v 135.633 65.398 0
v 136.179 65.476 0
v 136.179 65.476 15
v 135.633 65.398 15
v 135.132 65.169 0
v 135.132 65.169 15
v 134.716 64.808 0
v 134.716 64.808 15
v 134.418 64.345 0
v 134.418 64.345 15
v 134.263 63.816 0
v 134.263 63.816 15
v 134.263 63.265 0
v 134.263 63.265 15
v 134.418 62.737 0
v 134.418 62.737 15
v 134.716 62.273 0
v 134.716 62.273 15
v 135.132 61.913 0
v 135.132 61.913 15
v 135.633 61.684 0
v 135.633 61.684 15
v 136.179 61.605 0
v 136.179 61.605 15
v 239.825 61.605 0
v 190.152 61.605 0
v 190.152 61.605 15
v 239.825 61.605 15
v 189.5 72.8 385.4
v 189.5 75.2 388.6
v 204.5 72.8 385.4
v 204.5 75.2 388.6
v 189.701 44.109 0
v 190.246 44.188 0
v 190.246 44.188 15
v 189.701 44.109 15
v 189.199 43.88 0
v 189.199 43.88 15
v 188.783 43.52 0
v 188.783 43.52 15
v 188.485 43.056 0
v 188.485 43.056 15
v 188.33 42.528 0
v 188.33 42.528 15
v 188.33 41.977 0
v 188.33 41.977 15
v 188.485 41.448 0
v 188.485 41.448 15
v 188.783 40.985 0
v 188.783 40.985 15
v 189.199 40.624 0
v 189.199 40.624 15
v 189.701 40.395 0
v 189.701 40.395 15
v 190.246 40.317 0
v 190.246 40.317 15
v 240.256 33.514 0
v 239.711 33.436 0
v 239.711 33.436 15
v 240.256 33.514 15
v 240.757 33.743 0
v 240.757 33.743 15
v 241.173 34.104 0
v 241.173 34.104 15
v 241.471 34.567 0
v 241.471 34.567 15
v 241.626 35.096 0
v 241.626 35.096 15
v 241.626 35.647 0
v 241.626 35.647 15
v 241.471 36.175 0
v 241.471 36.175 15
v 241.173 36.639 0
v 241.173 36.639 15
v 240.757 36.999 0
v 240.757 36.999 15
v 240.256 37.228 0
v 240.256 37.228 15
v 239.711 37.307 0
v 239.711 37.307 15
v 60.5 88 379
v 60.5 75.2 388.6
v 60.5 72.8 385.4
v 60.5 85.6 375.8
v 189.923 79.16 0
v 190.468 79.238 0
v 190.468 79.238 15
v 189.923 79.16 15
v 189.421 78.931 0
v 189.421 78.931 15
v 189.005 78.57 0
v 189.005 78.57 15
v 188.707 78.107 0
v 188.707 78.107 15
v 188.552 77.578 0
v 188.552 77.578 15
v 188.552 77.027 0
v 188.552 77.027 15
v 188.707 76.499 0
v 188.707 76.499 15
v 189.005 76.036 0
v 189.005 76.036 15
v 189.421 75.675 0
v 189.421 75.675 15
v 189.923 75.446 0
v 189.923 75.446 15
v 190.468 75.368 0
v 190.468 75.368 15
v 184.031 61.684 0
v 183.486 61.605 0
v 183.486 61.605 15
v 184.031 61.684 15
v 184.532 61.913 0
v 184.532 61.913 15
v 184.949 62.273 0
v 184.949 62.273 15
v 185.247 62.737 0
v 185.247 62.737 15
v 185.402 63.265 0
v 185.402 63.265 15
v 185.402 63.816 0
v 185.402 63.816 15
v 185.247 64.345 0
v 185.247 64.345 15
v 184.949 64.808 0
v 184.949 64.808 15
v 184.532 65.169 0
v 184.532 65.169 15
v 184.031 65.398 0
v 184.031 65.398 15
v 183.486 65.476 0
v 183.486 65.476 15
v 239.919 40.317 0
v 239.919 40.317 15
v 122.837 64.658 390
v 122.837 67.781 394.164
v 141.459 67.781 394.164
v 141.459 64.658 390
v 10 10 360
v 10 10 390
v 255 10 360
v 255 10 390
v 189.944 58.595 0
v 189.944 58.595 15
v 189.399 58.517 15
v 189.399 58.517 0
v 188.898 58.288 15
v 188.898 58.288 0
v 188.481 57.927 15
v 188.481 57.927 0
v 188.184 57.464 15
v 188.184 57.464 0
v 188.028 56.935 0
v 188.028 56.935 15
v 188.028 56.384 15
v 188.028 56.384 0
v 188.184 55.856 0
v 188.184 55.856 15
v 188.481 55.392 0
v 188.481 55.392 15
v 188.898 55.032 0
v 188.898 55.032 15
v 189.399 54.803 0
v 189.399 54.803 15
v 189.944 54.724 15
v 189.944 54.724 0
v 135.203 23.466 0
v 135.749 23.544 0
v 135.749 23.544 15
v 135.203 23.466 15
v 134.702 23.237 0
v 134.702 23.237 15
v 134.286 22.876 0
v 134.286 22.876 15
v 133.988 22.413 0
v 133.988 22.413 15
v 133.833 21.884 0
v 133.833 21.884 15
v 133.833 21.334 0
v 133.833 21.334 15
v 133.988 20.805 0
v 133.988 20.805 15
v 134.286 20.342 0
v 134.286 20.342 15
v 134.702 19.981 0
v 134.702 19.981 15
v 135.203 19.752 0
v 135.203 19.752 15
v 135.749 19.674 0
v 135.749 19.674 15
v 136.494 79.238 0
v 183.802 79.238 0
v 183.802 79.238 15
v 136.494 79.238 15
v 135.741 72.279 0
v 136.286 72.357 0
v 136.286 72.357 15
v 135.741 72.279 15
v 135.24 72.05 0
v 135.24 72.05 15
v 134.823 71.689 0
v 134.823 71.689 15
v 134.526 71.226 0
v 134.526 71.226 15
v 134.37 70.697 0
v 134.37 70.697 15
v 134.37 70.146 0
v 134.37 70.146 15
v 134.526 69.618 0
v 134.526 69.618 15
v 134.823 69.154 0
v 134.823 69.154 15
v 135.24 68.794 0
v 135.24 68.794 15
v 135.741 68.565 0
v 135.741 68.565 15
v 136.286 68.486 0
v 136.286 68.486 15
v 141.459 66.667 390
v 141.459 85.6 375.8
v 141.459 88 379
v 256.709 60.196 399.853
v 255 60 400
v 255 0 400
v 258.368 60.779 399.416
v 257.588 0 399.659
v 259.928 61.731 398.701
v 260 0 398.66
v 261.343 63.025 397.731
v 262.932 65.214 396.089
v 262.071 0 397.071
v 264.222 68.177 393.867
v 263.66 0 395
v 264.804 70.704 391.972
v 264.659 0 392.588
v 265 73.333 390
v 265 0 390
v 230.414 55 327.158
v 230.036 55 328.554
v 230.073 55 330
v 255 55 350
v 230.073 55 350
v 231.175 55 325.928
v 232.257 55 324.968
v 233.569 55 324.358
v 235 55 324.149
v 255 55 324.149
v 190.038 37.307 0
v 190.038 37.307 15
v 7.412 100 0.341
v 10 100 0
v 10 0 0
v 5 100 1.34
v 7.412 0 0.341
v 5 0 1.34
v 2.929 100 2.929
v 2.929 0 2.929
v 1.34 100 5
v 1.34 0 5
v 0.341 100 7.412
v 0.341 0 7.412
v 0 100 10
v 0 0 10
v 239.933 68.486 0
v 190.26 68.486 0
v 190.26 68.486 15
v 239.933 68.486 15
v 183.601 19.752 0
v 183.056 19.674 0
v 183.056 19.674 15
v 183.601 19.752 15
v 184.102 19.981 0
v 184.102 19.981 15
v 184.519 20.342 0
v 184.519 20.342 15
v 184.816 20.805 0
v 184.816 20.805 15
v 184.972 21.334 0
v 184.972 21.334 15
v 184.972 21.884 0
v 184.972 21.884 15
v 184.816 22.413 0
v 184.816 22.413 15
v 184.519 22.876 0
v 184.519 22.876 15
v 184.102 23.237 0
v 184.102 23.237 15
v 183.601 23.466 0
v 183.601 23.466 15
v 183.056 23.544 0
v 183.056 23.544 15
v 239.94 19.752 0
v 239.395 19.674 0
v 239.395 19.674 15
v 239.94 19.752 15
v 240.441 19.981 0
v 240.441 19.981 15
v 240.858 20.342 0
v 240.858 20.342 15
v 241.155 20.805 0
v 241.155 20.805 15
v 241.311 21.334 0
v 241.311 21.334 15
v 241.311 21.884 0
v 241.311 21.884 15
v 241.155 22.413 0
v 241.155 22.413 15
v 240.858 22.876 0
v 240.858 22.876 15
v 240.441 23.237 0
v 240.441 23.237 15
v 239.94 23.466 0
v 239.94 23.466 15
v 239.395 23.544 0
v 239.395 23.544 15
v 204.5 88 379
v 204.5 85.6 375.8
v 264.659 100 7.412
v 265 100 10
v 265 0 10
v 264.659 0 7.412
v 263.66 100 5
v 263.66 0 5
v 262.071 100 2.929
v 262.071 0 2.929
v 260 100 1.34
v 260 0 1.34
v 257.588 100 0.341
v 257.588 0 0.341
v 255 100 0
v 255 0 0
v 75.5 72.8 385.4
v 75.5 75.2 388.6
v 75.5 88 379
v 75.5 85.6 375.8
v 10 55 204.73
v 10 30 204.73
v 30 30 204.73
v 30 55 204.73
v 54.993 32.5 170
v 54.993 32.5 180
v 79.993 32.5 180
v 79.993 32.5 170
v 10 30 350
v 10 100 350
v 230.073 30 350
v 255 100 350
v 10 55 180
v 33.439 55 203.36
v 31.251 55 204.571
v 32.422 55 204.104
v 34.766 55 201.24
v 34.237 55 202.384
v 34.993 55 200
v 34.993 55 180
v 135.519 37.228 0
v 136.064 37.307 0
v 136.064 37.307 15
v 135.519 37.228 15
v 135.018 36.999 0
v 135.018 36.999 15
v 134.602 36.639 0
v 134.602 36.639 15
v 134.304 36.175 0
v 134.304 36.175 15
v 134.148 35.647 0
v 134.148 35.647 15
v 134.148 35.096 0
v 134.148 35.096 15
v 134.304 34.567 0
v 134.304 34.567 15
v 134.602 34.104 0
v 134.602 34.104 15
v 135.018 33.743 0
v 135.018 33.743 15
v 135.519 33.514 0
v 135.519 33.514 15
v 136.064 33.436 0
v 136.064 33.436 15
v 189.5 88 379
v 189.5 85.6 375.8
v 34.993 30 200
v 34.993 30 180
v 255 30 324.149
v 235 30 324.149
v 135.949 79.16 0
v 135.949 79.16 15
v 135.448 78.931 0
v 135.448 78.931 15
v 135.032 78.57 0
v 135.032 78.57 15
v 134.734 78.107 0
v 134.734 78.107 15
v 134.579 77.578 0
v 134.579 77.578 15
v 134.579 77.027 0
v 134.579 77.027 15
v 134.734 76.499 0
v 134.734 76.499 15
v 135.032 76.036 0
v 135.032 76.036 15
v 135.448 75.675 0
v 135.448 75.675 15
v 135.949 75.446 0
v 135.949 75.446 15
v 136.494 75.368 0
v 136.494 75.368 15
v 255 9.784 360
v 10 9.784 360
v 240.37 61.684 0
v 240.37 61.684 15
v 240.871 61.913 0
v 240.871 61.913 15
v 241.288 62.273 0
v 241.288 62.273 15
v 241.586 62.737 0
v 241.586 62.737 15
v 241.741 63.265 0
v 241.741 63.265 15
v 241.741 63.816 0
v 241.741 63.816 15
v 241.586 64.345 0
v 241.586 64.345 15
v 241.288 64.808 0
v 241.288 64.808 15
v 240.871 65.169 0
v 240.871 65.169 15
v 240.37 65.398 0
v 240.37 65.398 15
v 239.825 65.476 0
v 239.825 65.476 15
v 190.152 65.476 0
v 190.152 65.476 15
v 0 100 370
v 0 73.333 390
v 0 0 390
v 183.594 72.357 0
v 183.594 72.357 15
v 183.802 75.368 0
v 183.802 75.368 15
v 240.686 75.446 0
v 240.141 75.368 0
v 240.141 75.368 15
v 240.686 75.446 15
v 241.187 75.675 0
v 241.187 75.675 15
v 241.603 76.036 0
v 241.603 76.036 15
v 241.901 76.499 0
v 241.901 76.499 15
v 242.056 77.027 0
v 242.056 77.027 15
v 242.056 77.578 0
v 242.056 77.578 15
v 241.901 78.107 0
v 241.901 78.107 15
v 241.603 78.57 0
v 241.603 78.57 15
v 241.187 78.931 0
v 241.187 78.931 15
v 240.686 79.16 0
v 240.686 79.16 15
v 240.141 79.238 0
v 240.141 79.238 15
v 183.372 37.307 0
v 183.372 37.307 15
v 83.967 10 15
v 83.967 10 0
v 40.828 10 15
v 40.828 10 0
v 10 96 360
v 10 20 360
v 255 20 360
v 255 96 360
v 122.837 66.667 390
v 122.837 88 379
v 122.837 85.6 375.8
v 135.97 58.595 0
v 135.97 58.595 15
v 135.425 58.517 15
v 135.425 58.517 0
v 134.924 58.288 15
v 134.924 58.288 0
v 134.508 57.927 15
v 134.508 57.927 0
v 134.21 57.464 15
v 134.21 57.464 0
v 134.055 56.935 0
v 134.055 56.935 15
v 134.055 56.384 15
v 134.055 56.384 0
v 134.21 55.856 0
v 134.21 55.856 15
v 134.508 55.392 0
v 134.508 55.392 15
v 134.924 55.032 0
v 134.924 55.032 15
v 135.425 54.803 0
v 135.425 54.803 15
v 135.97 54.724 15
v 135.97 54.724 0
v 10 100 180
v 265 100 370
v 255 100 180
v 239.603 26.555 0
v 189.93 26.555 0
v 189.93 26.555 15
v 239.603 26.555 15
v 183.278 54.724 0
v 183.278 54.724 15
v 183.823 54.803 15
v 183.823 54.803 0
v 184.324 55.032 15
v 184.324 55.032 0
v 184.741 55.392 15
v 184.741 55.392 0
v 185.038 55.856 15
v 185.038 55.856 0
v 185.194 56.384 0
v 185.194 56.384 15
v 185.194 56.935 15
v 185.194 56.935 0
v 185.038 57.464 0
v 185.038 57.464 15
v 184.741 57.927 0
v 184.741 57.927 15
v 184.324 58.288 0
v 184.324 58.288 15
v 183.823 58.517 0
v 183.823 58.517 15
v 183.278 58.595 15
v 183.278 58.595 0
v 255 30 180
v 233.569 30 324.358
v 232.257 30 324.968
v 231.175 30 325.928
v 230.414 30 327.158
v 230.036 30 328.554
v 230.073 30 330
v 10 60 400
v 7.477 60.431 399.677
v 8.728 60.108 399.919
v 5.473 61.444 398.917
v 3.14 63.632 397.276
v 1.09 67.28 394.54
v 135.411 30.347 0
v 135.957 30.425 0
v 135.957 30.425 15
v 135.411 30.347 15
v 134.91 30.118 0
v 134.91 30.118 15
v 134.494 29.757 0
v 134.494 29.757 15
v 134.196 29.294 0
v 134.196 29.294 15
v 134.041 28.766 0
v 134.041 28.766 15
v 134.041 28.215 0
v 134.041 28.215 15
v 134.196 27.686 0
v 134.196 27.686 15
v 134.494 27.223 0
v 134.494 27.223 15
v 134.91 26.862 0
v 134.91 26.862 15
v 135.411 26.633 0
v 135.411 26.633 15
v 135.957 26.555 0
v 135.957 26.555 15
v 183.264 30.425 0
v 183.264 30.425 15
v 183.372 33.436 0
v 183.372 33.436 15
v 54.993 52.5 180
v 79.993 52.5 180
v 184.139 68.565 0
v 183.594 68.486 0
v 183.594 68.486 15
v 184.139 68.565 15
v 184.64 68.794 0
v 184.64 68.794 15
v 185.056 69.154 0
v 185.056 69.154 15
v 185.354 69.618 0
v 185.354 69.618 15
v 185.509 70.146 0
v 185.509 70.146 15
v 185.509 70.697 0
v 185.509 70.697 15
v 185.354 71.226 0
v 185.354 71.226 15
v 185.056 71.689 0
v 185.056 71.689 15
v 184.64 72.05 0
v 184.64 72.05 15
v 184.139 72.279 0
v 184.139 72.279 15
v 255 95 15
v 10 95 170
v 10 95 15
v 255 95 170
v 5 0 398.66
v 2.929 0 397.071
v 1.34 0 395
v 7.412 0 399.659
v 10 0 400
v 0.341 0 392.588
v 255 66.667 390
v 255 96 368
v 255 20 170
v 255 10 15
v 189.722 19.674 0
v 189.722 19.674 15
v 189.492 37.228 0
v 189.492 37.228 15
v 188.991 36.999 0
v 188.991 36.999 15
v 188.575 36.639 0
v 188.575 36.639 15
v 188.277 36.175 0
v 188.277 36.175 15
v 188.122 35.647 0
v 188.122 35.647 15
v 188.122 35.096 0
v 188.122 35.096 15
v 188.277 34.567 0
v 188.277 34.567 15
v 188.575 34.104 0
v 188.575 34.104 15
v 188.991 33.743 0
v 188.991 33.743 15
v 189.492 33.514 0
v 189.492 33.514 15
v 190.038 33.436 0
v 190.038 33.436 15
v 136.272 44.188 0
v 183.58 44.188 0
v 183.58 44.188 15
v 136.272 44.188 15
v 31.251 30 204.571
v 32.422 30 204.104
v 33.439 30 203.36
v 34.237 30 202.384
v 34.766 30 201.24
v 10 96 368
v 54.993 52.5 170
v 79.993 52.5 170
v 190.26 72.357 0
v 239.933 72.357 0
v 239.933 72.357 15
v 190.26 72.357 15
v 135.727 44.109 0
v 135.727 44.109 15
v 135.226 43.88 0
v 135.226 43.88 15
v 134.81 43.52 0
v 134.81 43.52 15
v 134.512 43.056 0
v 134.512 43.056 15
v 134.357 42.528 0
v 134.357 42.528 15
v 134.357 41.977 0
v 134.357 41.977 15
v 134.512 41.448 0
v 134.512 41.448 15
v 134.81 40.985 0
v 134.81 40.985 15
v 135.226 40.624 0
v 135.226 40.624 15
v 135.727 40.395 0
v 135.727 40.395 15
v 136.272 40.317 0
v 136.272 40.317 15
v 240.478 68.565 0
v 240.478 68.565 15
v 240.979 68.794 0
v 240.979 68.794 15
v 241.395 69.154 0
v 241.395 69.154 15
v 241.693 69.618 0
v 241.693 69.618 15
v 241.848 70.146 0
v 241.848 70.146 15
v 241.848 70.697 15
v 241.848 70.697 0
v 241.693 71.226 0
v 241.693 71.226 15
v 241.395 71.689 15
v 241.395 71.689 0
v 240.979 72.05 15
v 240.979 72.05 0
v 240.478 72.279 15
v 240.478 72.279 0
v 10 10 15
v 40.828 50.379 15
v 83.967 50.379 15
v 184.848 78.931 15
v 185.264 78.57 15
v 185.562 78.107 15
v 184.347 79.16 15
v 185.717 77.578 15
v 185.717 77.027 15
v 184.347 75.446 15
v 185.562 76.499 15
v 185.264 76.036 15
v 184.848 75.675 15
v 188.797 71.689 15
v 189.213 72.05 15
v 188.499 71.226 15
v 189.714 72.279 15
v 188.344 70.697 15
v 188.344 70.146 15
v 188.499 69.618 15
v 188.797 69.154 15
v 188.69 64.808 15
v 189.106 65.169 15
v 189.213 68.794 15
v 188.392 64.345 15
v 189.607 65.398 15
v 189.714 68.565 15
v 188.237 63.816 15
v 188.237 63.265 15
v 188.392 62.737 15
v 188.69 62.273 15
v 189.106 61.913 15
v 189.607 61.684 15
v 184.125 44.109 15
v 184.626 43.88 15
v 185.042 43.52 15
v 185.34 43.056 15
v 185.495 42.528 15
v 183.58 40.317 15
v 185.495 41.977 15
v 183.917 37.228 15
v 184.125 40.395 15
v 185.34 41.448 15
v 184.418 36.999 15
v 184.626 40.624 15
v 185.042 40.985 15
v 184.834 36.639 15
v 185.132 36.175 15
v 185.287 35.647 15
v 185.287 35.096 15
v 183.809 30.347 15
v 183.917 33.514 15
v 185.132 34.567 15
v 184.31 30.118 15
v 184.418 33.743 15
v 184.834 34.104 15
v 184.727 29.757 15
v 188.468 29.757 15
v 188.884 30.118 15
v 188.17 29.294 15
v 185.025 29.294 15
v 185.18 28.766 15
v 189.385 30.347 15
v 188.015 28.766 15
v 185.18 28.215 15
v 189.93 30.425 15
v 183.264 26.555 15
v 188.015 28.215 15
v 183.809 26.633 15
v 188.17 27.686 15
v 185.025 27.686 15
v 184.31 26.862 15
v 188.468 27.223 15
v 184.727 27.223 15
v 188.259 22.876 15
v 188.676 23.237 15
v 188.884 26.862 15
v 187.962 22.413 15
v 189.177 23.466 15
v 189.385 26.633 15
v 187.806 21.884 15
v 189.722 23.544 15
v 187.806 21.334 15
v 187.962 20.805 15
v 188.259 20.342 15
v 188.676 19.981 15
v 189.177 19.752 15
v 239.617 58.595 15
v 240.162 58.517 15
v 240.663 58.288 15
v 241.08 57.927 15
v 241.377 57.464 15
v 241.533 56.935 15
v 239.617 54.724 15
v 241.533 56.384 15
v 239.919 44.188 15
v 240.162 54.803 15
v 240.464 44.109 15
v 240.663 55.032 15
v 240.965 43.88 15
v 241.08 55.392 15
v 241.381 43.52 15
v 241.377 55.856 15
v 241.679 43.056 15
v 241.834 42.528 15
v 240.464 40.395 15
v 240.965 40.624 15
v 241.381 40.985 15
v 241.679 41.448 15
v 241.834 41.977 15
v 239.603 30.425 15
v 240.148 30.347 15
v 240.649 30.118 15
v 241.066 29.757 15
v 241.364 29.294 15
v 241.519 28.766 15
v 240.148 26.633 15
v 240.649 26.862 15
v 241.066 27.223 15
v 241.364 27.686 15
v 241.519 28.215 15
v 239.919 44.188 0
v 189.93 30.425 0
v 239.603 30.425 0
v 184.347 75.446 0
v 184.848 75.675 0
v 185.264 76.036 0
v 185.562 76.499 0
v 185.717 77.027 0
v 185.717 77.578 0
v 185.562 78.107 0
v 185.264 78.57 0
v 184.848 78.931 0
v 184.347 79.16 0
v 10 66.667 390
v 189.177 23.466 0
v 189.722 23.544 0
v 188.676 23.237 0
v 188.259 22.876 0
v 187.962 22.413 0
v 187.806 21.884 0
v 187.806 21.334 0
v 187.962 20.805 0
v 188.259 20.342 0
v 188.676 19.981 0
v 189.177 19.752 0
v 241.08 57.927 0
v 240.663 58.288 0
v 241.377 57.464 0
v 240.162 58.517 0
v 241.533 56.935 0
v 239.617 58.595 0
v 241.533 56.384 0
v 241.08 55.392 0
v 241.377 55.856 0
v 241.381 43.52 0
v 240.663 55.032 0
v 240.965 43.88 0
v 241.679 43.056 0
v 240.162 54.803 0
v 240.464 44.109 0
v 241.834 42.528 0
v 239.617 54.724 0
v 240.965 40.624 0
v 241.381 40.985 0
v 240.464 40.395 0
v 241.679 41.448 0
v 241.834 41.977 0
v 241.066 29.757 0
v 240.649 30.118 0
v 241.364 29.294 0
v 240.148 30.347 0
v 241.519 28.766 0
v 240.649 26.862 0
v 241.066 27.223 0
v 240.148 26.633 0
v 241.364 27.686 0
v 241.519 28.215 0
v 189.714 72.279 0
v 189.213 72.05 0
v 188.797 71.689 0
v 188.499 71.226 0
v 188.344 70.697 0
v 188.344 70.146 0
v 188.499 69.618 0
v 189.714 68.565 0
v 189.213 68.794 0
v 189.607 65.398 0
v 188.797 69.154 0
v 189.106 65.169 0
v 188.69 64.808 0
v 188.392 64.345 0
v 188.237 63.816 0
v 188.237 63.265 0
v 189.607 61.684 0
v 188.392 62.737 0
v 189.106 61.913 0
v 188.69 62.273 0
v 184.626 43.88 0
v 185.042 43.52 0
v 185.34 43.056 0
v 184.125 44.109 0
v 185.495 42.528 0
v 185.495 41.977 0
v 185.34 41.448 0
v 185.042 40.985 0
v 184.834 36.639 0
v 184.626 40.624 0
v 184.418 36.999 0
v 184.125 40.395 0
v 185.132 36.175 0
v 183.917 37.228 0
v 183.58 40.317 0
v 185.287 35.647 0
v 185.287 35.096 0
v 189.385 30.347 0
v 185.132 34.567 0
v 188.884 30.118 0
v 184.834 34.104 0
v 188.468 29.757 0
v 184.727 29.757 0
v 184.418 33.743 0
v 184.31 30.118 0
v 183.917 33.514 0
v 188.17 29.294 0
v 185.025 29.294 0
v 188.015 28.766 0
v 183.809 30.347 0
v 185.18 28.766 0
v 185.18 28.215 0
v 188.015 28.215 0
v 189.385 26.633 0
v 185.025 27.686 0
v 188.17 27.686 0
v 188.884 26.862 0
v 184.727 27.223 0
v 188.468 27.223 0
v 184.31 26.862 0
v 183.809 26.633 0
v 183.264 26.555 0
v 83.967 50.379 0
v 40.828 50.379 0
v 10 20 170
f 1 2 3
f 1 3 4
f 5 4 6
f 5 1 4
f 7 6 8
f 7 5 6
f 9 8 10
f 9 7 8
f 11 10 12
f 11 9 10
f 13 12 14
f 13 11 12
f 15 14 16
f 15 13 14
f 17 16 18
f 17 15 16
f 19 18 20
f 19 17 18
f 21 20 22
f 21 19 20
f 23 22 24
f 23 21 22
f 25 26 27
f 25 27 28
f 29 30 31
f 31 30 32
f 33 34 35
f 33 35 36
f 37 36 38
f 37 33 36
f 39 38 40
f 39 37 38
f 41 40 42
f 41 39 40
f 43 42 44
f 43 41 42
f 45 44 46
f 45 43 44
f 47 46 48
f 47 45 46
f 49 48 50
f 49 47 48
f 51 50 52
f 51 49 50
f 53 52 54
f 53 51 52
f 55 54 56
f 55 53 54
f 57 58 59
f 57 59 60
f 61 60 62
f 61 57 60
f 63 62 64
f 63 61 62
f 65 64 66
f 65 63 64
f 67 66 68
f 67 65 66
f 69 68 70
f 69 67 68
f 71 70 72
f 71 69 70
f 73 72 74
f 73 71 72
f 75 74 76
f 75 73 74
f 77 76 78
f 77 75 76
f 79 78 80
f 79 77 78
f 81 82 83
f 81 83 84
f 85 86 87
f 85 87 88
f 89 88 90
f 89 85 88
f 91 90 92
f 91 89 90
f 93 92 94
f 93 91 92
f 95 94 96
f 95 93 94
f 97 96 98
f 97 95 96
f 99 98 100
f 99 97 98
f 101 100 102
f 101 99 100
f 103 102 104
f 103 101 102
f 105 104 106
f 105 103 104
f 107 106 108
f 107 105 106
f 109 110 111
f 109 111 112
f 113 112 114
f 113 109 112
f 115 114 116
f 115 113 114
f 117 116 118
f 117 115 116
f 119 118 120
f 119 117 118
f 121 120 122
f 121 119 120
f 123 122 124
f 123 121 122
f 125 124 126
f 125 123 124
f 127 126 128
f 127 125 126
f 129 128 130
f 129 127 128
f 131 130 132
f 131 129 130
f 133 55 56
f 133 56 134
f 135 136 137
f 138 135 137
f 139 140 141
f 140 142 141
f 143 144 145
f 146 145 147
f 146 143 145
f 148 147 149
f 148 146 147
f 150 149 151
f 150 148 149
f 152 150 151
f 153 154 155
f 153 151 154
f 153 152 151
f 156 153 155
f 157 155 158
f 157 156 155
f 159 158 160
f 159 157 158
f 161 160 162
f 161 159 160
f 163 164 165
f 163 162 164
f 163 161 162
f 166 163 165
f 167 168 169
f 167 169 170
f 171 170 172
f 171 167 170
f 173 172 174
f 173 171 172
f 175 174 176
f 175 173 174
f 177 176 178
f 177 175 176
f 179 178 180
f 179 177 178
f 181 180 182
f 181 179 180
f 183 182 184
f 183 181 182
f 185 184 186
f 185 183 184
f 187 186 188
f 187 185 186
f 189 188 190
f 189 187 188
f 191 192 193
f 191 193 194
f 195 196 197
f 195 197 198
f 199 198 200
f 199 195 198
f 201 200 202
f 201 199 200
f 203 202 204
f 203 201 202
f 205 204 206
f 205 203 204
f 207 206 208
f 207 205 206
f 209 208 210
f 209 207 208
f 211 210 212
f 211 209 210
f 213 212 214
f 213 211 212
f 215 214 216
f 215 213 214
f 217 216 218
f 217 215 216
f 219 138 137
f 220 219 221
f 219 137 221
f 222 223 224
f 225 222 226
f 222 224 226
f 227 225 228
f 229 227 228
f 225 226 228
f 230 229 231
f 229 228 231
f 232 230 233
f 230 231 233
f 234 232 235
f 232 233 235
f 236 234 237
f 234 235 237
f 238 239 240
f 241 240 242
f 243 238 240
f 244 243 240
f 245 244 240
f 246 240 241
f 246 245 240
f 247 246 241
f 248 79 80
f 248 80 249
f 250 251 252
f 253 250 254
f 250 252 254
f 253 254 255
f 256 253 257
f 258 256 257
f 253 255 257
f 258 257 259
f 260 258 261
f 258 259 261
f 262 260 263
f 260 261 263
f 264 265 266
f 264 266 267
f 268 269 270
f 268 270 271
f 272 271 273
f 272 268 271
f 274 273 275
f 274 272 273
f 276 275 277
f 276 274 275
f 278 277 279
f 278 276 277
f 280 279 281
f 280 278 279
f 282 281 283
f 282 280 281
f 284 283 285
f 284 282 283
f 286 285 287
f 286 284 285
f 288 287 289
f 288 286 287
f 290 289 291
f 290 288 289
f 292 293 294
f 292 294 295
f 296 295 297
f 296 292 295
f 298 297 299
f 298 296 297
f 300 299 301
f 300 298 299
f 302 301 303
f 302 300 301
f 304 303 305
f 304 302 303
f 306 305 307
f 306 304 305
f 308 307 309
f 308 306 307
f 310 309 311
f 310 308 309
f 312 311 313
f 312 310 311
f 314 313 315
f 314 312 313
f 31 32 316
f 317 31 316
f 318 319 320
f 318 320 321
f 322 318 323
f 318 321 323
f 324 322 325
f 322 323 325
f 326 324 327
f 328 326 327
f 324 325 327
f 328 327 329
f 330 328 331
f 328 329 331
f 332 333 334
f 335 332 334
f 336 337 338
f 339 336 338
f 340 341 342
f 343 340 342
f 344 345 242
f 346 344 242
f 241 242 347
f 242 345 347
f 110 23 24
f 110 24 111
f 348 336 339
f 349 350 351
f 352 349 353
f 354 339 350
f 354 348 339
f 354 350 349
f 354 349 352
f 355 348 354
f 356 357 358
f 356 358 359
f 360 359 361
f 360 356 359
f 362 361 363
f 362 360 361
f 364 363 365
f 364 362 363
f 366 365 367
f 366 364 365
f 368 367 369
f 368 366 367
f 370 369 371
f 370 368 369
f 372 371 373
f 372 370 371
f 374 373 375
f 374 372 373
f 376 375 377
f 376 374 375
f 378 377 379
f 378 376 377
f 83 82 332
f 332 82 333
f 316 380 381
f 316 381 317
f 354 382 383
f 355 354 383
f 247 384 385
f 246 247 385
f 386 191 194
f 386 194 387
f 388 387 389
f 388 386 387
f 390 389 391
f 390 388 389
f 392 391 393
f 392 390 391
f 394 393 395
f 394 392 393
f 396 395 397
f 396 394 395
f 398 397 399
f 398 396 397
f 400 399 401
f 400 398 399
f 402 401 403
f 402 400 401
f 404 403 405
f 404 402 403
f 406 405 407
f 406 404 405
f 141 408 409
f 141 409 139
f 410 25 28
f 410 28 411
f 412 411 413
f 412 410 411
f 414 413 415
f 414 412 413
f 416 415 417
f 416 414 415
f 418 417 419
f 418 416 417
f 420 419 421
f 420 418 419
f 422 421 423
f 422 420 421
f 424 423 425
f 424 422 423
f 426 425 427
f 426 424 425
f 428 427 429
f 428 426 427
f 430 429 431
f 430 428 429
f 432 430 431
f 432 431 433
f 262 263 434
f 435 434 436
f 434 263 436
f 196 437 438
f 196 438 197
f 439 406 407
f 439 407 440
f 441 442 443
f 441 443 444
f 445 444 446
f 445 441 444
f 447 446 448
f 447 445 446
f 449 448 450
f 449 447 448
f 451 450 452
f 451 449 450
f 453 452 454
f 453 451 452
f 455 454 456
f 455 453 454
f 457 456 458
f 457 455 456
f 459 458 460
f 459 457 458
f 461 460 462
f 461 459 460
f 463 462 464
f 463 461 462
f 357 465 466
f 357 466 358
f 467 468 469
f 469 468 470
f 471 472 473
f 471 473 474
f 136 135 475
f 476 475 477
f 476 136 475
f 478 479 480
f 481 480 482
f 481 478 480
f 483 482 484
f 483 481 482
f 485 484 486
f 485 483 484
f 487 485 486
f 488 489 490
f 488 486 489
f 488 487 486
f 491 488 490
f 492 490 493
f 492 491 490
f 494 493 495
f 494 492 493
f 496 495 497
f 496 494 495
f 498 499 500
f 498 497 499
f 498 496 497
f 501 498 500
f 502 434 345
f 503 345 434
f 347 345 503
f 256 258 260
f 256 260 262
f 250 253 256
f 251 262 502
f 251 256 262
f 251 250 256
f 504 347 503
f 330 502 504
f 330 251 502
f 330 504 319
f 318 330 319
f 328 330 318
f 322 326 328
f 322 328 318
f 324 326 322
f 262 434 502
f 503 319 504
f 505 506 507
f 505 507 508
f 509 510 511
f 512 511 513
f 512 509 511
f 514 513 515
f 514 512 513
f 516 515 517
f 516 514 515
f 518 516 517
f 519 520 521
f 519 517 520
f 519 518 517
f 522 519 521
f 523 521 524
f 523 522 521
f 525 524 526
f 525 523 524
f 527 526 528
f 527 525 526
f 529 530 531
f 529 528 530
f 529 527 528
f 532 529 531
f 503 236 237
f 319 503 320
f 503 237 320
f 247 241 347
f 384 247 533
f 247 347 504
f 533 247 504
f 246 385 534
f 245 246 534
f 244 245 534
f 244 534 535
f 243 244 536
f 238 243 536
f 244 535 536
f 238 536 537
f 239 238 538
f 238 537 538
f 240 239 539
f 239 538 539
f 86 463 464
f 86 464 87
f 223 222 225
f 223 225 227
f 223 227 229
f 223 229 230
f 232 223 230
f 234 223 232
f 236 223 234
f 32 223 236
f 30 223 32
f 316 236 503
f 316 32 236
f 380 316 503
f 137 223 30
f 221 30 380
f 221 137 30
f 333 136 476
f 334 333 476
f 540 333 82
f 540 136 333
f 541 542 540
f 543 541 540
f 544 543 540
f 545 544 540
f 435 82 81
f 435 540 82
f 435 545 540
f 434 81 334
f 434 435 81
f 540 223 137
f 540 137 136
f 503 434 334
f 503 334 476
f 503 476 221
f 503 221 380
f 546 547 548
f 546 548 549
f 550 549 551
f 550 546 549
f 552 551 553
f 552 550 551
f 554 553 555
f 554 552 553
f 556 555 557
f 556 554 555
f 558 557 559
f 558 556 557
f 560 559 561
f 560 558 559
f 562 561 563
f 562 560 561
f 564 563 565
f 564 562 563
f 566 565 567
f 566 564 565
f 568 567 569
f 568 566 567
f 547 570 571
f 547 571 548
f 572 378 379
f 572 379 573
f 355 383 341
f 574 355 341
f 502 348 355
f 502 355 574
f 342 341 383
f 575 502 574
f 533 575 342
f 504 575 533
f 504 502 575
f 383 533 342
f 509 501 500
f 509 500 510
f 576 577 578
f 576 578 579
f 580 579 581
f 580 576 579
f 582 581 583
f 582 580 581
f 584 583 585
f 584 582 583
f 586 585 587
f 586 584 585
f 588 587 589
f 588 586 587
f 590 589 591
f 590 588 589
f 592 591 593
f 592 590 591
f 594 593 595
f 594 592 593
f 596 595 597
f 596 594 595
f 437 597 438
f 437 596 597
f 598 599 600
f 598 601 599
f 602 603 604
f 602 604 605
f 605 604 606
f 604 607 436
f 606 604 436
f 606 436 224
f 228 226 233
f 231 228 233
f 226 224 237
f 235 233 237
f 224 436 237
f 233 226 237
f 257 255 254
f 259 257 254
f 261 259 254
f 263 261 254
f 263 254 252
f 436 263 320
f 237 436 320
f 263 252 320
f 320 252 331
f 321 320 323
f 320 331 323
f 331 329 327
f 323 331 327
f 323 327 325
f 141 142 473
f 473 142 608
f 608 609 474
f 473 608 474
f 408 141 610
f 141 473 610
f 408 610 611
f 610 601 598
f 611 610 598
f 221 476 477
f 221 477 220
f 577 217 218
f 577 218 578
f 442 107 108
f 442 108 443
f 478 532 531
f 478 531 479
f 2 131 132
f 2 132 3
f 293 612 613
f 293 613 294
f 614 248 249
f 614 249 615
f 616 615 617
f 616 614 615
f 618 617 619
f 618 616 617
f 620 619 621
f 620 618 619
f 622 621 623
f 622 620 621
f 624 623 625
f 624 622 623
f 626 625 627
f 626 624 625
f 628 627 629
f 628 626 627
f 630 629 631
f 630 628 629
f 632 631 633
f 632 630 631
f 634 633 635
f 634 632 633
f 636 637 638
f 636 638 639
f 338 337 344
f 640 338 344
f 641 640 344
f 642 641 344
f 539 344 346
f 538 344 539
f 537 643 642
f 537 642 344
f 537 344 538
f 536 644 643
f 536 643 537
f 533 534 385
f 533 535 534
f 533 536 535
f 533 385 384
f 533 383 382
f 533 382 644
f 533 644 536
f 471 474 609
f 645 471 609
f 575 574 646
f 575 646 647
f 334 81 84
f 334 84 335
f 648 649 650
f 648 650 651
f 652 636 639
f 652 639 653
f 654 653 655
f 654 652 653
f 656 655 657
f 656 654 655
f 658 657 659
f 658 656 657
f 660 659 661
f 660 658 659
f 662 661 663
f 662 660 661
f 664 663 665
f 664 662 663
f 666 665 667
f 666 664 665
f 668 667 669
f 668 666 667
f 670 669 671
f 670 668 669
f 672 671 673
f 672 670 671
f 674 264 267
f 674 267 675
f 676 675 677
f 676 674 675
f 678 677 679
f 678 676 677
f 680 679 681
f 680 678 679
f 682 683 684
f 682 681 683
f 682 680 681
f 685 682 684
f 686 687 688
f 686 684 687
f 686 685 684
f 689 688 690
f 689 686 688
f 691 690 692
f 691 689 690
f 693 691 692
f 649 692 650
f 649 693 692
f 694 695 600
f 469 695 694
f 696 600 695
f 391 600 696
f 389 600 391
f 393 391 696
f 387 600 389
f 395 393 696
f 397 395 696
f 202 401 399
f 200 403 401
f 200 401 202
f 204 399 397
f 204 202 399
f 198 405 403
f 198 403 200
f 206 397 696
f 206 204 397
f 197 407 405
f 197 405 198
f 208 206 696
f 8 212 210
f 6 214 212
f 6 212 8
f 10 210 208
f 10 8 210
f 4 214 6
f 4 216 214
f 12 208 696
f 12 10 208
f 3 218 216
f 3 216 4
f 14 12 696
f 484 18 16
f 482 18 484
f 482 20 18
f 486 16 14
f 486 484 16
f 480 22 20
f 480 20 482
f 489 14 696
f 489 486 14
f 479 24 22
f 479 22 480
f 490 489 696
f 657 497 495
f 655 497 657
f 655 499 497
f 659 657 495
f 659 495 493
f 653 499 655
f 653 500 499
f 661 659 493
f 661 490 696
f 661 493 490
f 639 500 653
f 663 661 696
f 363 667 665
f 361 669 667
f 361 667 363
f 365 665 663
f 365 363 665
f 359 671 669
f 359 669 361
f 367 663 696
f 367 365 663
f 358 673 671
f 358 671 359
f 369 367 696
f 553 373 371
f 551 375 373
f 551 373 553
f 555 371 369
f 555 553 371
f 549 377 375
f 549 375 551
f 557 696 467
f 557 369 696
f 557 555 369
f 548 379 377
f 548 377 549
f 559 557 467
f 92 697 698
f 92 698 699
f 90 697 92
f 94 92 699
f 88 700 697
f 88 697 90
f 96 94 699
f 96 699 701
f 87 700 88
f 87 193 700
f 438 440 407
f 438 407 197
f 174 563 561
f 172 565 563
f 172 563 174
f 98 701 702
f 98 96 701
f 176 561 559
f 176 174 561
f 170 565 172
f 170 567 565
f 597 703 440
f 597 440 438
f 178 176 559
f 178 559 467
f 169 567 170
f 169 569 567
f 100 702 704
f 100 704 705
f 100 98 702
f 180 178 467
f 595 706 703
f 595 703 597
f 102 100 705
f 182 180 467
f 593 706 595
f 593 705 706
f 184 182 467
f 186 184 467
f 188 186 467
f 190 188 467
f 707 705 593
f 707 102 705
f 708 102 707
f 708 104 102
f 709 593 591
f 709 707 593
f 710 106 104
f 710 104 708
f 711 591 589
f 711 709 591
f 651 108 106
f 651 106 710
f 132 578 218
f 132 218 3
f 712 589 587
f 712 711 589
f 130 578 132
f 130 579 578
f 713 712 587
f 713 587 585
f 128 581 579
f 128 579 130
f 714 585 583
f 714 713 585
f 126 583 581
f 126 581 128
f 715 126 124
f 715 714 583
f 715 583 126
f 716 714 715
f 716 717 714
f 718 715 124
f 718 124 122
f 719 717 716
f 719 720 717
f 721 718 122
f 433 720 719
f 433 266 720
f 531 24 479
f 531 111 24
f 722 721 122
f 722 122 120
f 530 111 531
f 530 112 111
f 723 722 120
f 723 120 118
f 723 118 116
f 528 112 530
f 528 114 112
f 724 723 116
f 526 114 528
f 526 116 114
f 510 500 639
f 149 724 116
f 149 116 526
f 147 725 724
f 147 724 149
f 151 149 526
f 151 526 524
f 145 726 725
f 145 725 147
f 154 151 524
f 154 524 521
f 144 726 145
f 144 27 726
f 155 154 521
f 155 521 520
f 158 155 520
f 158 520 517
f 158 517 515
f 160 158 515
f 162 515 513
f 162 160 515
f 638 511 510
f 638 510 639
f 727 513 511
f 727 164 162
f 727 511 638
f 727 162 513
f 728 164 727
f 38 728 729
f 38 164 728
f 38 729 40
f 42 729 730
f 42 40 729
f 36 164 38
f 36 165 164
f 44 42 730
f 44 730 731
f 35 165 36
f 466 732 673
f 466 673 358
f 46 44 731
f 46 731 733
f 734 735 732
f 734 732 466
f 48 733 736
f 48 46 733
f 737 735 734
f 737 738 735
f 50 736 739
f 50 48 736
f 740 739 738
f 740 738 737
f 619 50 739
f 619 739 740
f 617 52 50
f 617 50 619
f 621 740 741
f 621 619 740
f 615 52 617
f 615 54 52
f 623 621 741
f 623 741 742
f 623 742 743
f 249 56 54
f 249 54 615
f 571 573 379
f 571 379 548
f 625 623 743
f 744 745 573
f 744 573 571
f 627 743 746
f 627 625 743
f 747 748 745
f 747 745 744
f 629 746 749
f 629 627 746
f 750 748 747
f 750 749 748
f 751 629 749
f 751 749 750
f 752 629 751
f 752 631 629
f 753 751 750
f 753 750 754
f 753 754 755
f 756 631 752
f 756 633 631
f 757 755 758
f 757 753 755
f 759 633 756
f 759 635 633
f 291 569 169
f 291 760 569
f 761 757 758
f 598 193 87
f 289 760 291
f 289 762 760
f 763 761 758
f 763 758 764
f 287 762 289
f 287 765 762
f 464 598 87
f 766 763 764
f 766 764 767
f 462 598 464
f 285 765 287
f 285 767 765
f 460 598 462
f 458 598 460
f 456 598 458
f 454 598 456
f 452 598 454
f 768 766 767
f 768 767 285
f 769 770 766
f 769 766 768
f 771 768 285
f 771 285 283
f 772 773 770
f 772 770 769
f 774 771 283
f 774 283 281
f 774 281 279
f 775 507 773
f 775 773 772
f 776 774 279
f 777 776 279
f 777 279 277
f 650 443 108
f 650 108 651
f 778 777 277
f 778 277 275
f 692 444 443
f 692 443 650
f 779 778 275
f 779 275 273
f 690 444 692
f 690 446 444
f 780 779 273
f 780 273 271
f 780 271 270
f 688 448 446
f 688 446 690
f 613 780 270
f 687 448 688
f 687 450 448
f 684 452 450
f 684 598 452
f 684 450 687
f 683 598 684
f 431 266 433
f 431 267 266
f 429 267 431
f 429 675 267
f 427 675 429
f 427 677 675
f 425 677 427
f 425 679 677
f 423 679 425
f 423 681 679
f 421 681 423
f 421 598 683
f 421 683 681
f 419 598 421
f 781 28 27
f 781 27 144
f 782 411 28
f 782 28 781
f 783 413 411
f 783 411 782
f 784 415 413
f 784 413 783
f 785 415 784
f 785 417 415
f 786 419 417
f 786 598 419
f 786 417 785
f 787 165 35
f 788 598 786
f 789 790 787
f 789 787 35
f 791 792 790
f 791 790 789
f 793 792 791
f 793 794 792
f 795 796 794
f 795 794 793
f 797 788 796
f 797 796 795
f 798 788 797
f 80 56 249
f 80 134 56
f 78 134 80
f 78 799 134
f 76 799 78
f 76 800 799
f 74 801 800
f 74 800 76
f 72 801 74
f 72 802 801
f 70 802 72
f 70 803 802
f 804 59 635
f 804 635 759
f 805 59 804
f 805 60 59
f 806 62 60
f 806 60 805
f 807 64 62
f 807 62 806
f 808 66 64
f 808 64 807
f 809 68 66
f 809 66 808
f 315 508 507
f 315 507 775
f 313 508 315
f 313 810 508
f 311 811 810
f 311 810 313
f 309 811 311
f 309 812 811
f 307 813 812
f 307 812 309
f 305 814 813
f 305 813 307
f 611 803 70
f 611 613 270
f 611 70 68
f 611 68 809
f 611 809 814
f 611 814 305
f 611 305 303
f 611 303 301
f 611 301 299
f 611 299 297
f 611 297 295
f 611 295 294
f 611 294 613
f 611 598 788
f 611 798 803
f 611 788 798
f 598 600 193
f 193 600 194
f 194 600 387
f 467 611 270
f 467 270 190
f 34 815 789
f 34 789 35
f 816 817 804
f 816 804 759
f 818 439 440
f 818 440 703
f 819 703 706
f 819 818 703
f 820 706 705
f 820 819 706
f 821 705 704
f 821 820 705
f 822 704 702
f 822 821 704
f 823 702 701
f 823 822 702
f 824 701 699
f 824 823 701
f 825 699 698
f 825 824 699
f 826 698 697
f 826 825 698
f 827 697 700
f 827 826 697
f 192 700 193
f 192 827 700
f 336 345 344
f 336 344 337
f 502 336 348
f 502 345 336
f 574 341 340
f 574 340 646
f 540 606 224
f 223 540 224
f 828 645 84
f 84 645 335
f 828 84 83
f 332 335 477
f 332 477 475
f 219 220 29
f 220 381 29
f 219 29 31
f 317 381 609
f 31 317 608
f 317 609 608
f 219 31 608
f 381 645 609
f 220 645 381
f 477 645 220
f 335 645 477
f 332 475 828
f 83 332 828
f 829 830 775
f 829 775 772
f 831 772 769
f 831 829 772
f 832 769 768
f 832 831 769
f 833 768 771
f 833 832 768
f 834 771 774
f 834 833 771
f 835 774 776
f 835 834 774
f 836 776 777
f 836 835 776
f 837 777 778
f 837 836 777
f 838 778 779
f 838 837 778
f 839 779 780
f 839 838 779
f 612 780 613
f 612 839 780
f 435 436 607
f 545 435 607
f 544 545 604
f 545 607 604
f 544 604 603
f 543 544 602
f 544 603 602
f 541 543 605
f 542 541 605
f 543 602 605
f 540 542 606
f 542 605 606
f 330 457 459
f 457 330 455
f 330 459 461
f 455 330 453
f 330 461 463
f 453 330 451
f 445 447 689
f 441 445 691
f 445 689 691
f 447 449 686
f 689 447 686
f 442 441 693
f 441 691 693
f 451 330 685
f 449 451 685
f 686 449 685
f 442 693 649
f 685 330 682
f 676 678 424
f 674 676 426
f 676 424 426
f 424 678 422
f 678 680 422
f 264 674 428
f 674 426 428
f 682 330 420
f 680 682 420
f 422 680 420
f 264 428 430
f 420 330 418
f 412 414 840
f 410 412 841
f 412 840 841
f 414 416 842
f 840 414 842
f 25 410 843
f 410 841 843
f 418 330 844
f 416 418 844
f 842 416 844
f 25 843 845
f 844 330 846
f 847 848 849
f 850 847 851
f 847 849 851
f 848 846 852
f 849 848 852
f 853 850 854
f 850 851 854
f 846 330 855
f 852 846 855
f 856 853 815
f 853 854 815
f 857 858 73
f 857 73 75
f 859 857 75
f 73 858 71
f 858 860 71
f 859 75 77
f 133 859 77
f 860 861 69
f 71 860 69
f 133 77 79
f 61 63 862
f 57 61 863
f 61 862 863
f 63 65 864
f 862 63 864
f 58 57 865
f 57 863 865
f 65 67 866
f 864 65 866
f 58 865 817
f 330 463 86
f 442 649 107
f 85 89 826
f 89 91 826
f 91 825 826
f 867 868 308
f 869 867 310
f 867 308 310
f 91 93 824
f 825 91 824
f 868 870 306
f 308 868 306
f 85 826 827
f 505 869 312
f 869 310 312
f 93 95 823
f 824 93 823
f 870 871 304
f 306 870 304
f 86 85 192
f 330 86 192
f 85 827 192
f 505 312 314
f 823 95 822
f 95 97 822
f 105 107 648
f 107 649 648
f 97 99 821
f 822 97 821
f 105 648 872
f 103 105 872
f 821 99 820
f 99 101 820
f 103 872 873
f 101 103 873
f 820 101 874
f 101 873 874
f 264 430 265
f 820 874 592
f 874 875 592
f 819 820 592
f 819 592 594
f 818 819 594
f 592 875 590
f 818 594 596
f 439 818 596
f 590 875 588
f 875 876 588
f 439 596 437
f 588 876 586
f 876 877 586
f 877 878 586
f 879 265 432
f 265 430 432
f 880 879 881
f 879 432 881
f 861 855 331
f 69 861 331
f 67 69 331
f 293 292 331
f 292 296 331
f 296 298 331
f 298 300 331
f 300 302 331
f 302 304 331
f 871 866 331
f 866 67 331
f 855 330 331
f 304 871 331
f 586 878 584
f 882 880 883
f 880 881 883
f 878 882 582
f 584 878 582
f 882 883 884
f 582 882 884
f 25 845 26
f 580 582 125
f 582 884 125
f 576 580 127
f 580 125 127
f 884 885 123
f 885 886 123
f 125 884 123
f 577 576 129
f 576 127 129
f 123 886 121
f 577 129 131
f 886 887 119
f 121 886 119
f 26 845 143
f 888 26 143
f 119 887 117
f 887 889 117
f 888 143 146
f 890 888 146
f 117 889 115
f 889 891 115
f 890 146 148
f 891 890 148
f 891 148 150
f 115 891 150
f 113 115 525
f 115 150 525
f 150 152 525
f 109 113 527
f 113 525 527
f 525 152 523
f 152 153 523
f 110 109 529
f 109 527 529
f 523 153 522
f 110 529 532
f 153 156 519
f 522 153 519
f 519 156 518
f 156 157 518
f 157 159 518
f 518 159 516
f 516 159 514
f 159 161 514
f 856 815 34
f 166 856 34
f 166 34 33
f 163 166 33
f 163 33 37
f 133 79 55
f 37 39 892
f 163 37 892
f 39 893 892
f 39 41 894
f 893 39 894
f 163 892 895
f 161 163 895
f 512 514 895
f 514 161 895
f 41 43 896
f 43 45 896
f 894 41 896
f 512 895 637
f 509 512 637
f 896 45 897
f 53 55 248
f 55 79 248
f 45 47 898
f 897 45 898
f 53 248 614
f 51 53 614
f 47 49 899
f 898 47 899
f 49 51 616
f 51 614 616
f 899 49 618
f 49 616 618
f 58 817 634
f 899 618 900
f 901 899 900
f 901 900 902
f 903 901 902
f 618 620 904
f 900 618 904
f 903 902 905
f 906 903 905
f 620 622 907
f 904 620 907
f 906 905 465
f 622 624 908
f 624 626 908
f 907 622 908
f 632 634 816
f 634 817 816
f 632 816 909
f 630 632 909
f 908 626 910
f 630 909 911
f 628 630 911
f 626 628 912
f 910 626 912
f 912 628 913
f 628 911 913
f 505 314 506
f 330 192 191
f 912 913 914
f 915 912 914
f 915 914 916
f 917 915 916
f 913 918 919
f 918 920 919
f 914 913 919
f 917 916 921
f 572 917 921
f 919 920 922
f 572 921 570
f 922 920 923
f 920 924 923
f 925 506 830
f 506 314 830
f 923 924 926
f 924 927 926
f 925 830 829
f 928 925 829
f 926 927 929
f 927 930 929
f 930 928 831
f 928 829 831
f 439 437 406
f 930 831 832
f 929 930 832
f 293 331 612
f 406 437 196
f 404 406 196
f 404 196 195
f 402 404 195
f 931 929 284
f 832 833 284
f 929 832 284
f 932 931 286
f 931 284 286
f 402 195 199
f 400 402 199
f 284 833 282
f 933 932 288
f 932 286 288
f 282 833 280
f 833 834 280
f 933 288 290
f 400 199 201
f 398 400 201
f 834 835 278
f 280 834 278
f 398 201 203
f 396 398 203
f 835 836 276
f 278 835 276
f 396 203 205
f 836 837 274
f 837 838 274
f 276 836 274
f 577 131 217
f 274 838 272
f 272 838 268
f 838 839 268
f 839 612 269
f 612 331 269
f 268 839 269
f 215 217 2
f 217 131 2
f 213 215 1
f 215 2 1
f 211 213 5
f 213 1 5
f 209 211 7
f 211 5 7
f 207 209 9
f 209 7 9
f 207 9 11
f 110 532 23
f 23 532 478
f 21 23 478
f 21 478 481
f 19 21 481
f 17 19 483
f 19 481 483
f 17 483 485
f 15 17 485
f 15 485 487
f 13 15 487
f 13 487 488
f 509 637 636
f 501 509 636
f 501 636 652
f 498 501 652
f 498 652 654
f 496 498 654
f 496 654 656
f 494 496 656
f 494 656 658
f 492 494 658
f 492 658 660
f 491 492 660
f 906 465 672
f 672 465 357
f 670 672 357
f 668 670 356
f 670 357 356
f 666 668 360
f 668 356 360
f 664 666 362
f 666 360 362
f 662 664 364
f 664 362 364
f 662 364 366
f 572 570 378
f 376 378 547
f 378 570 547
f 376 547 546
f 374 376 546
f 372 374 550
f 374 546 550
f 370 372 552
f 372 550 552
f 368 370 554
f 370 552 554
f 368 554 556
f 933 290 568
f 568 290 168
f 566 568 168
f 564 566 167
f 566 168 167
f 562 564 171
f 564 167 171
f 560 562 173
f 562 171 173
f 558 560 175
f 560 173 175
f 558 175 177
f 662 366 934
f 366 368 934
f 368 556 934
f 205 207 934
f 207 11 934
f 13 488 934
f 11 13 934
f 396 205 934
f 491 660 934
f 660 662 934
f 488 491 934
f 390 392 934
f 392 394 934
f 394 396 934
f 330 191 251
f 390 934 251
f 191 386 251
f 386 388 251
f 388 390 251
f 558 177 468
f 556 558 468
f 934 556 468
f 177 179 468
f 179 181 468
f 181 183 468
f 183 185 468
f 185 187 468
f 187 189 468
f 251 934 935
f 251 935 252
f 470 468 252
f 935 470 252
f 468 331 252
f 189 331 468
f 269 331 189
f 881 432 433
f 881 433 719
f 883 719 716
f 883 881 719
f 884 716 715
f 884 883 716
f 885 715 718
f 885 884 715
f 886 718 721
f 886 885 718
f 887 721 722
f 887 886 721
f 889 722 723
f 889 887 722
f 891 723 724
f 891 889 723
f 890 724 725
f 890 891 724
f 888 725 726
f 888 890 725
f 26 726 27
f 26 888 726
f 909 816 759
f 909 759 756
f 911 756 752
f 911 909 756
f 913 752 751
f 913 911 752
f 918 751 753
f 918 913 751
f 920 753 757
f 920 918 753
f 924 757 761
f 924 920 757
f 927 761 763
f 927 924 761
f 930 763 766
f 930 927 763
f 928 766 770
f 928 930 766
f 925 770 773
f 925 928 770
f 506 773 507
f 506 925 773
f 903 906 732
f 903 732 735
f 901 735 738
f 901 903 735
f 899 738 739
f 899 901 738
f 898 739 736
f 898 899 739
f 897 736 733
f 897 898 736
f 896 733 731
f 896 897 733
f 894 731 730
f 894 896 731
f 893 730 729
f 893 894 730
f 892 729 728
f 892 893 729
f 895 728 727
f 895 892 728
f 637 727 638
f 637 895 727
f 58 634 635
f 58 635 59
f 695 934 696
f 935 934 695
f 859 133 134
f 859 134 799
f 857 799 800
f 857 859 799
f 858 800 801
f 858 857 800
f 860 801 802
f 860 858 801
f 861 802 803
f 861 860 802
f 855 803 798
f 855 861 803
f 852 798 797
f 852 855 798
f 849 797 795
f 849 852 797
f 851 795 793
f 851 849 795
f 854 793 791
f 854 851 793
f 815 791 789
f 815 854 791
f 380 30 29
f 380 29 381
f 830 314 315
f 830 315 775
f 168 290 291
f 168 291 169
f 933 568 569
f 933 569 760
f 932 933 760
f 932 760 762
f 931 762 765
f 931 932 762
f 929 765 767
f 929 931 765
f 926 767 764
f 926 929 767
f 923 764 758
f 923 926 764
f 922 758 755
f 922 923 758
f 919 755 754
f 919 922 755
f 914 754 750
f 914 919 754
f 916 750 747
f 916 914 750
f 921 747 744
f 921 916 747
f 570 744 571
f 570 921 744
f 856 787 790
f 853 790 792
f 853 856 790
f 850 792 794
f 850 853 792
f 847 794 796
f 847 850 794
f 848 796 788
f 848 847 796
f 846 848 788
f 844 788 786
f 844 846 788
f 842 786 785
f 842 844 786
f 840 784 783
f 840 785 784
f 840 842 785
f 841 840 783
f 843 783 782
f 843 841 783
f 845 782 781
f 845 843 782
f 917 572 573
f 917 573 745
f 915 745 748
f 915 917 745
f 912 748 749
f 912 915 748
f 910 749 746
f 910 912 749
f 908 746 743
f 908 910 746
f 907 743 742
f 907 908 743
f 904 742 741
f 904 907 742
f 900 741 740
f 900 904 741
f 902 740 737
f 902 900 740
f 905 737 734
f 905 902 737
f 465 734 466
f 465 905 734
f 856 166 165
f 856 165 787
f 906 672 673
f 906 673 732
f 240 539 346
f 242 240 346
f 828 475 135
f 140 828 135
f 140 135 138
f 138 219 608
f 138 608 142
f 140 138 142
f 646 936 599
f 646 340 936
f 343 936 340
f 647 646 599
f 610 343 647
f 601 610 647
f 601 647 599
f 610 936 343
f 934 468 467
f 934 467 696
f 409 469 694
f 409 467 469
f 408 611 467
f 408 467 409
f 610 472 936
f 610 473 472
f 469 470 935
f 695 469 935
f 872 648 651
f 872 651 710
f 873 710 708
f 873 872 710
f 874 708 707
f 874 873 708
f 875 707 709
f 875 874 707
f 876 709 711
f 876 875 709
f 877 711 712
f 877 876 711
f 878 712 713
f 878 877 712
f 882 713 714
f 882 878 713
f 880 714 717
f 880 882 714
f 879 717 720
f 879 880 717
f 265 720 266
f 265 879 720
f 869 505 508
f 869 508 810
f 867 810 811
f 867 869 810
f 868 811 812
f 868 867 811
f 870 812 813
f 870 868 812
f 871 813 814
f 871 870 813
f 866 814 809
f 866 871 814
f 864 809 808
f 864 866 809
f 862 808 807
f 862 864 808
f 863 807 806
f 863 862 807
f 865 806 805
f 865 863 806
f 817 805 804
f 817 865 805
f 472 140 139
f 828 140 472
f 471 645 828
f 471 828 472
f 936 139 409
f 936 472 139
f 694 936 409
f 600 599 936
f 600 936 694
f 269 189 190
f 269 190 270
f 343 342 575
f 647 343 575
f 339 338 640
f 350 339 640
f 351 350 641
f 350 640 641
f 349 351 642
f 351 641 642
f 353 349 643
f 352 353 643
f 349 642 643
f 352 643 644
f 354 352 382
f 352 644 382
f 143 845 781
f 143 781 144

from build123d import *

# Parameters (mm, degrees)
BOSS_EXTRUDE2_DEPTH      = 100
SKETCH4_W                = 245
SKETCH4_H                = 170
CUT_EXTRUDE2_DEPTH       = 70
CUT_EXTRUDE12_DEPTH      = 434.077648927
CUT_EXTRUDE12_DEPTH_BACK = 434.077648927
CUT_EXTRUDE13_DEPTH      = 122.5
CUT_EXTRUDE14_DEPTH      = 122.5
SKETCH16_W               = 43.138722299
SKETCH16_H               = 40.379444726
CUT_EXTRUDE15_DEPTH      = 30
SKETCH17_W               = 15
SKETCH17_H               = 16
SKETCH17_W_2             = 18.622276722
SKETCH17_H_2             = 25.273514742
CUT_EXTRUDE16_DEPTH      = 10
BOSS_EXTRUDE3_DEPTH      = 25
SKETCH19_W               = 25
SKETCH19_H               = 20
CUT_EXTRUDE17_DEPTH      = 15


with BuildPart() as part:
    # Sketch1 → Boss-Extrude2 (new body)
    with BuildSketch(Plane(origin=(0, 0, 0), x_dir=(1, 0, 0), z_dir=(0, 1, 0))):
        with BuildLine():
            Line((0, -10), (0, -390))
            ThreePointArc((0, -390), (2.928932188, -397.071067812), (10, -400))
            Line((10, -400), (255, -400))
            ThreePointArc((255, -400), (262.071067812, -397.071067812), (265, -390))
            Line((265, -390), (265, -10))
            ThreePointArc((265, -10), (262.071067812, -2.928932188), (255, 0))
            Line((255, 0), (10, 0))
            ThreePointArc((10, 0), (2.928932188, -2.928932188), (0, -10))
        make_face()
    extrude(amount=BOSS_EXTRUDE2_DEPTH)

    # Sketch4 → Cut-Extrude2 (cut)
    with BuildSketch(Plane(origin=(0, 100, 0), x_dir=(1, 0, 0), z_dir=(0, 1, 0))):
        with Locations((132.5, -265)):
            Rectangle(SKETCH4_W, SKETCH4_H)
    extrude(amount=-CUT_EXTRUDE2_DEPTH, mode=Mode.SUBTRACT)

    # Sketch10 → Cut-Extrude12 (cut, two sides: drawn at the far end of the back side and taken through both)
    with BuildSketch(Plane(origin=(132.5, 0, 0), x_dir=(0, 0, -1), z_dir=(1, 0, 0)).offset(-CUT_EXTRUDE12_DEPTH_BACK)):
        Polygon((-400, 60), (-370, 100), (-400, 100), align=None)
    extrude(amount=CUT_EXTRUDE12_DEPTH + CUT_EXTRUDE12_DEPTH_BACK, mode=Mode.SUBTRACT)

    # Sketch14 → Cut-Extrude13 (cut, symmetric)
    with BuildSketch(Plane(origin=(132.5, 0, 0), x_dir=(0, 0, -1), z_dir=(1, 0, 0))):
        Polygon((-390, 10), (-360, 10), (-360, 96), (-368, 96), (-390, 66.666666667), align=None)
    extrude(amount=CUT_EXTRUDE13_DEPTH, both=True, mode=Mode.SUBTRACT)

    # Sketch15 → Cut-Extrude14 (cut, symmetric)
    with BuildSketch(Plane(origin=(132.5, 0, 0), x_dir=(0, 0, -1), z_dir=(1, 0, 0))):
        Polygon((-360, 9.784104138), (-360, 20), (-170, 20), (-170, 95), (-15, 95), (-15, 10), align=None)
    extrude(amount=CUT_EXTRUDE14_DEPTH, both=True, mode=Mode.SUBTRACT)

    # Sketch16 → Cut-Extrude15 (cut)
    with BuildSketch(Plane(origin=(0, 0, 0), x_dir=(-1, 0, 0), z_dir=(0, 0, -1))):
        with BuildLine():
            Line((-240.140690251, 79.23821095), (-190.467776295, 79.23821095))
            ThreePointArc((-190.467776295, 79.23821095), (-188.532467959, 77.302902614), (-190.467776295, 75.367594278))
            Line((-190.467776295, 75.367594278), (-240.140690251, 75.367594278))
            ThreePointArc((-240.140690251, 75.367594278), (-242.075998587, 77.302902614), (-240.140690251, 79.23821095))
        make_face()
        with BuildLine():
            Line((-183.801714249, 79.23821095), (-136.494177148, 79.23821095))
            ThreePointArc((-136.494177148, 79.23821095), (-134.558868812, 77.302902614), (-136.494177148, 75.367594278))
            Line((-136.494177148, 75.367594278), (-183.801714249, 75.367594278))
            ThreePointArc((-183.801714249, 75.367594278), (-185.737022585, 77.302902614), (-183.801714249, 79.23821095))
        make_face()
        with BuildLine():
            Line((-239.932606186, 72.357114645), (-190.25969223, 72.357114645))
            ThreePointArc((-190.25969223, 72.357114645), (-188.324383894, 70.421806309), (-190.25969223, 68.486497973))
            Line((-190.25969223, 68.486497973), (-239.932606186, 68.486497973))
            ThreePointArc((-239.932606186, 68.486497973), (-241.867914521, 70.421806309), (-239.932606186, 72.357114645))
        make_face()
        with BuildLine():
            Line((-183.593630184, 72.357114645), (-136.286093083, 72.357114645))
            ThreePointArc((-136.286093083, 72.357114645), (-134.350784747, 70.421806309), (-136.286093083, 68.486497973))
            Line((-136.286093083, 68.486497973), (-183.593630184, 68.486497973))
            ThreePointArc((-183.593630184, 68.486497973), (-185.52893852, 70.421806309), (-183.593630184, 72.357114645))
        make_face()
        with BuildLine():
            Line((-239.825089056, 65.476018339), (-190.1521751, 65.476018339))
            ThreePointArc((-190.1521751, 65.476018339), (-188.216866764, 63.540710003), (-190.1521751, 61.605401667))
            Line((-190.1521751, 61.605401667), (-239.825089056, 61.605401667))
            ThreePointArc((-239.825089056, 61.605401667), (-241.760397392, 63.540710003), (-239.825089056, 65.476018339))
        make_face()
        with BuildLine():
            Line((-183.486113054, 65.476018339), (-136.178575953, 65.476018339))
            ThreePointArc((-136.178575953, 65.476018339), (-134.243267617, 63.540710003), (-136.178575953, 61.605401667))
            Line((-136.178575953, 61.605401667), (-183.486113054, 61.605401667))
            ThreePointArc((-183.486113054, 61.605401667), (-185.42142139, 63.540710003), (-183.486113054, 65.476018339))
        make_face()
        with BuildLine():
            Line((-239.617004991, 58.594922033), (-189.944091035, 58.594922033))
            ThreePointArc((-189.944091035, 58.594922033), (-188.008782699, 56.659613697), (-189.944091035, 54.724305362))
            Line((-189.944091035, 54.724305362), (-239.617004991, 54.724305362))
            ThreePointArc((-239.617004991, 54.724305362), (-241.552313326, 56.659613697), (-239.617004991, 58.594922033))
        make_face()
        with BuildLine():
            Line((-183.278028989, 58.594922033), (-135.970491888, 58.594922033))
            ThreePointArc((-135.970491888, 58.594922033), (-134.035183552, 56.659613697), (-135.970491888, 54.724305362))
            Line((-135.970491888, 54.724305362), (-183.278028989, 54.724305362))
            ThreePointArc((-183.278028989, 54.724305362), (-185.213337325, 56.659613697), (-183.278028989, 58.594922033))
        make_face()
        with BuildLine():
            Line((-239.918705797, 44.187626644), (-190.245791841, 44.187626644))
            ThreePointArc((-190.245791841, 44.187626644), (-188.310483505, 42.252318308), (-190.245791841, 40.317009972))
            Line((-190.245791841, 40.317009972), (-239.918705797, 40.317009972))
            ThreePointArc((-239.918705797, 40.317009972), (-241.854014133, 42.252318308), (-239.918705797, 44.187626644))
        make_face()
        with BuildLine():
            Line((-183.579729795, 44.187626644), (-136.272192694, 44.187626644))
            ThreePointArc((-136.272192694, 44.187626644), (-134.336884358, 42.252318308), (-136.272192694, 40.317009972))
            Line((-136.272192694, 40.317009972), (-183.579729795, 40.317009972))
            ThreePointArc((-183.579729795, 40.317009972), (-185.515038131, 42.252318308), (-183.579729795, 44.187626644))
        make_face()
        with BuildLine():
            Line((-239.710621732, 37.306530338), (-190.037707776, 37.306530338))
            ThreePointArc((-190.037707776, 37.306530338), (-188.10239944, 35.371222002), (-190.037707776, 33.435913666))
            Line((-190.037707776, 33.435913666), (-239.710621732, 33.435913666))
            ThreePointArc((-239.710621732, 33.435913666), (-241.645930068, 35.371222002), (-239.710621732, 37.306530338))
        make_face()
        with BuildLine():
            Line((-183.37164573, 37.306530338), (-136.064108629, 37.306530338))
            ThreePointArc((-136.064108629, 37.306530338), (-134.128800293, 35.371222002), (-136.064108629, 33.435913666))
            Line((-136.064108629, 33.435913666), (-183.37164573, 33.435913666))
            ThreePointArc((-183.37164573, 33.435913666), (-185.306954066, 35.371222002), (-183.37164573, 37.306530338))
        make_face()
        with BuildLine():
            Line((-239.603104602, 30.425434033), (-189.930190646, 30.425434033))
            ThreePointArc((-189.930190646, 30.425434033), (-187.99488231, 28.490125697), (-189.930190646, 26.554817361))
            Line((-189.930190646, 26.554817361), (-239.603104602, 26.554817361))
            ThreePointArc((-239.603104602, 26.554817361), (-241.538412938, 28.490125697), (-239.603104602, 30.425434033))
        make_face()
        with BuildLine():
            Line((-183.2641286, 30.425434033), (-135.956591499, 30.425434033))
            ThreePointArc((-135.956591499, 30.425434033), (-134.021283163, 28.490125697), (-135.956591499, 26.554817361))
            Line((-135.956591499, 26.554817361), (-183.2641286, 26.554817361))
            ThreePointArc((-183.2641286, 26.554817361), (-185.199436936, 28.490125697), (-183.2641286, 30.425434033))
        make_face()
        with BuildLine():
            Line((-239.395020537, 23.544337727), (-189.722106581, 23.544337727))
            ThreePointArc((-189.722106581, 23.544337727), (-187.786798245, 21.609029391), (-189.722106581, 19.673721055))
            Line((-189.722106581, 19.673721055), (-239.395020537, 19.673721055))
            ThreePointArc((-239.395020537, 19.673721055), (-241.330328873, 21.609029391), (-239.395020537, 23.544337727))
        make_face()
        with BuildLine():
            Line((-183.056044535, 23.544337727), (-135.748507434, 23.544337727))
            ThreePointArc((-135.748507434, 23.544337727), (-133.813199098, 21.609029391), (-135.748507434, 19.673721055))
            Line((-135.748507434, 19.673721055), (-183.056044535, 19.673721055))
            ThreePointArc((-183.056044535, 19.673721055), (-184.991352871, 21.609029391), (-183.056044535, 23.544337727))
        make_face()
        with Locations((-62.397436661, 30.189722363)):
            Rectangle(SKETCH16_W, SKETCH16_H)
    extrude(amount=-CUT_EXTRUDE15_DEPTH, mode=Mode.SUBTRACT)

    # Sketch17 → Cut-Extrude16 (cut)
    with BuildSketch(Plane(origin=(0, 213.6, 284.8), x_dir=(1, 0, 0), z_dir=(0, 0.5999999999999998, 0.8000000000000004))):
        with Locations((68, -165)):
            Rectangle(SKETCH17_W, SKETCH17_H)
        with Locations((197, -165)):
            Rectangle(SKETCH17_W, SKETCH17_H)
        with Locations((132.148099668, -169.636757371)):
            Rectangle(SKETCH17_W_2, SKETCH17_H_2)
    extrude(amount=-CUT_EXTRUDE16_DEPTH, mode=Mode.SUBTRACT)

    # Sketch18 → Boss-Extrude3 (add)
    with BuildSketch(Plane(origin=(0, 30, 0), x_dir=(1, 0, 0), z_dir=(0, 1, 0))):
        with BuildLine():
            Line((10, -180), (10, -204.729927007))
            Line((10, -204.729927007), (30, -204.729927007))
            ThreePointArc((30, -204.729927007), (33.43872324, -203.359690427), (34.99270073, -200))
            Line((34.99270073, -200), (34.99270073, -180))
            Line((34.99270073, -180), (10, -180))
        make_face()
        with BuildLine():
            Line((255, -350), (255, -324.14910859))
            Line((255, -324.14910859), (235, -324.14910859))
            ThreePointArc((235, -324.14910859), (231.175444009, -325.928429861), (230.072933549, -330))
            Line((230.072933549, -330), (230.072933549, -350))
            Line((230.072933549, -350), (255, -350))
        make_face()
    extrude(amount=BOSS_EXTRUDE3_DEPTH)

    # Sketch19 → Cut-Extrude17 (cut)
    with BuildSketch(Plane.XY.offset(180)):
        with Locations((67.49270073, 42.5)):
            Rectangle(SKETCH19_W, SKETCH19_H)
    extrude(amount=-CUT_EXTRUDE17_DEPTH, mode=Mode.SUBTRACT)


solid = part.part
